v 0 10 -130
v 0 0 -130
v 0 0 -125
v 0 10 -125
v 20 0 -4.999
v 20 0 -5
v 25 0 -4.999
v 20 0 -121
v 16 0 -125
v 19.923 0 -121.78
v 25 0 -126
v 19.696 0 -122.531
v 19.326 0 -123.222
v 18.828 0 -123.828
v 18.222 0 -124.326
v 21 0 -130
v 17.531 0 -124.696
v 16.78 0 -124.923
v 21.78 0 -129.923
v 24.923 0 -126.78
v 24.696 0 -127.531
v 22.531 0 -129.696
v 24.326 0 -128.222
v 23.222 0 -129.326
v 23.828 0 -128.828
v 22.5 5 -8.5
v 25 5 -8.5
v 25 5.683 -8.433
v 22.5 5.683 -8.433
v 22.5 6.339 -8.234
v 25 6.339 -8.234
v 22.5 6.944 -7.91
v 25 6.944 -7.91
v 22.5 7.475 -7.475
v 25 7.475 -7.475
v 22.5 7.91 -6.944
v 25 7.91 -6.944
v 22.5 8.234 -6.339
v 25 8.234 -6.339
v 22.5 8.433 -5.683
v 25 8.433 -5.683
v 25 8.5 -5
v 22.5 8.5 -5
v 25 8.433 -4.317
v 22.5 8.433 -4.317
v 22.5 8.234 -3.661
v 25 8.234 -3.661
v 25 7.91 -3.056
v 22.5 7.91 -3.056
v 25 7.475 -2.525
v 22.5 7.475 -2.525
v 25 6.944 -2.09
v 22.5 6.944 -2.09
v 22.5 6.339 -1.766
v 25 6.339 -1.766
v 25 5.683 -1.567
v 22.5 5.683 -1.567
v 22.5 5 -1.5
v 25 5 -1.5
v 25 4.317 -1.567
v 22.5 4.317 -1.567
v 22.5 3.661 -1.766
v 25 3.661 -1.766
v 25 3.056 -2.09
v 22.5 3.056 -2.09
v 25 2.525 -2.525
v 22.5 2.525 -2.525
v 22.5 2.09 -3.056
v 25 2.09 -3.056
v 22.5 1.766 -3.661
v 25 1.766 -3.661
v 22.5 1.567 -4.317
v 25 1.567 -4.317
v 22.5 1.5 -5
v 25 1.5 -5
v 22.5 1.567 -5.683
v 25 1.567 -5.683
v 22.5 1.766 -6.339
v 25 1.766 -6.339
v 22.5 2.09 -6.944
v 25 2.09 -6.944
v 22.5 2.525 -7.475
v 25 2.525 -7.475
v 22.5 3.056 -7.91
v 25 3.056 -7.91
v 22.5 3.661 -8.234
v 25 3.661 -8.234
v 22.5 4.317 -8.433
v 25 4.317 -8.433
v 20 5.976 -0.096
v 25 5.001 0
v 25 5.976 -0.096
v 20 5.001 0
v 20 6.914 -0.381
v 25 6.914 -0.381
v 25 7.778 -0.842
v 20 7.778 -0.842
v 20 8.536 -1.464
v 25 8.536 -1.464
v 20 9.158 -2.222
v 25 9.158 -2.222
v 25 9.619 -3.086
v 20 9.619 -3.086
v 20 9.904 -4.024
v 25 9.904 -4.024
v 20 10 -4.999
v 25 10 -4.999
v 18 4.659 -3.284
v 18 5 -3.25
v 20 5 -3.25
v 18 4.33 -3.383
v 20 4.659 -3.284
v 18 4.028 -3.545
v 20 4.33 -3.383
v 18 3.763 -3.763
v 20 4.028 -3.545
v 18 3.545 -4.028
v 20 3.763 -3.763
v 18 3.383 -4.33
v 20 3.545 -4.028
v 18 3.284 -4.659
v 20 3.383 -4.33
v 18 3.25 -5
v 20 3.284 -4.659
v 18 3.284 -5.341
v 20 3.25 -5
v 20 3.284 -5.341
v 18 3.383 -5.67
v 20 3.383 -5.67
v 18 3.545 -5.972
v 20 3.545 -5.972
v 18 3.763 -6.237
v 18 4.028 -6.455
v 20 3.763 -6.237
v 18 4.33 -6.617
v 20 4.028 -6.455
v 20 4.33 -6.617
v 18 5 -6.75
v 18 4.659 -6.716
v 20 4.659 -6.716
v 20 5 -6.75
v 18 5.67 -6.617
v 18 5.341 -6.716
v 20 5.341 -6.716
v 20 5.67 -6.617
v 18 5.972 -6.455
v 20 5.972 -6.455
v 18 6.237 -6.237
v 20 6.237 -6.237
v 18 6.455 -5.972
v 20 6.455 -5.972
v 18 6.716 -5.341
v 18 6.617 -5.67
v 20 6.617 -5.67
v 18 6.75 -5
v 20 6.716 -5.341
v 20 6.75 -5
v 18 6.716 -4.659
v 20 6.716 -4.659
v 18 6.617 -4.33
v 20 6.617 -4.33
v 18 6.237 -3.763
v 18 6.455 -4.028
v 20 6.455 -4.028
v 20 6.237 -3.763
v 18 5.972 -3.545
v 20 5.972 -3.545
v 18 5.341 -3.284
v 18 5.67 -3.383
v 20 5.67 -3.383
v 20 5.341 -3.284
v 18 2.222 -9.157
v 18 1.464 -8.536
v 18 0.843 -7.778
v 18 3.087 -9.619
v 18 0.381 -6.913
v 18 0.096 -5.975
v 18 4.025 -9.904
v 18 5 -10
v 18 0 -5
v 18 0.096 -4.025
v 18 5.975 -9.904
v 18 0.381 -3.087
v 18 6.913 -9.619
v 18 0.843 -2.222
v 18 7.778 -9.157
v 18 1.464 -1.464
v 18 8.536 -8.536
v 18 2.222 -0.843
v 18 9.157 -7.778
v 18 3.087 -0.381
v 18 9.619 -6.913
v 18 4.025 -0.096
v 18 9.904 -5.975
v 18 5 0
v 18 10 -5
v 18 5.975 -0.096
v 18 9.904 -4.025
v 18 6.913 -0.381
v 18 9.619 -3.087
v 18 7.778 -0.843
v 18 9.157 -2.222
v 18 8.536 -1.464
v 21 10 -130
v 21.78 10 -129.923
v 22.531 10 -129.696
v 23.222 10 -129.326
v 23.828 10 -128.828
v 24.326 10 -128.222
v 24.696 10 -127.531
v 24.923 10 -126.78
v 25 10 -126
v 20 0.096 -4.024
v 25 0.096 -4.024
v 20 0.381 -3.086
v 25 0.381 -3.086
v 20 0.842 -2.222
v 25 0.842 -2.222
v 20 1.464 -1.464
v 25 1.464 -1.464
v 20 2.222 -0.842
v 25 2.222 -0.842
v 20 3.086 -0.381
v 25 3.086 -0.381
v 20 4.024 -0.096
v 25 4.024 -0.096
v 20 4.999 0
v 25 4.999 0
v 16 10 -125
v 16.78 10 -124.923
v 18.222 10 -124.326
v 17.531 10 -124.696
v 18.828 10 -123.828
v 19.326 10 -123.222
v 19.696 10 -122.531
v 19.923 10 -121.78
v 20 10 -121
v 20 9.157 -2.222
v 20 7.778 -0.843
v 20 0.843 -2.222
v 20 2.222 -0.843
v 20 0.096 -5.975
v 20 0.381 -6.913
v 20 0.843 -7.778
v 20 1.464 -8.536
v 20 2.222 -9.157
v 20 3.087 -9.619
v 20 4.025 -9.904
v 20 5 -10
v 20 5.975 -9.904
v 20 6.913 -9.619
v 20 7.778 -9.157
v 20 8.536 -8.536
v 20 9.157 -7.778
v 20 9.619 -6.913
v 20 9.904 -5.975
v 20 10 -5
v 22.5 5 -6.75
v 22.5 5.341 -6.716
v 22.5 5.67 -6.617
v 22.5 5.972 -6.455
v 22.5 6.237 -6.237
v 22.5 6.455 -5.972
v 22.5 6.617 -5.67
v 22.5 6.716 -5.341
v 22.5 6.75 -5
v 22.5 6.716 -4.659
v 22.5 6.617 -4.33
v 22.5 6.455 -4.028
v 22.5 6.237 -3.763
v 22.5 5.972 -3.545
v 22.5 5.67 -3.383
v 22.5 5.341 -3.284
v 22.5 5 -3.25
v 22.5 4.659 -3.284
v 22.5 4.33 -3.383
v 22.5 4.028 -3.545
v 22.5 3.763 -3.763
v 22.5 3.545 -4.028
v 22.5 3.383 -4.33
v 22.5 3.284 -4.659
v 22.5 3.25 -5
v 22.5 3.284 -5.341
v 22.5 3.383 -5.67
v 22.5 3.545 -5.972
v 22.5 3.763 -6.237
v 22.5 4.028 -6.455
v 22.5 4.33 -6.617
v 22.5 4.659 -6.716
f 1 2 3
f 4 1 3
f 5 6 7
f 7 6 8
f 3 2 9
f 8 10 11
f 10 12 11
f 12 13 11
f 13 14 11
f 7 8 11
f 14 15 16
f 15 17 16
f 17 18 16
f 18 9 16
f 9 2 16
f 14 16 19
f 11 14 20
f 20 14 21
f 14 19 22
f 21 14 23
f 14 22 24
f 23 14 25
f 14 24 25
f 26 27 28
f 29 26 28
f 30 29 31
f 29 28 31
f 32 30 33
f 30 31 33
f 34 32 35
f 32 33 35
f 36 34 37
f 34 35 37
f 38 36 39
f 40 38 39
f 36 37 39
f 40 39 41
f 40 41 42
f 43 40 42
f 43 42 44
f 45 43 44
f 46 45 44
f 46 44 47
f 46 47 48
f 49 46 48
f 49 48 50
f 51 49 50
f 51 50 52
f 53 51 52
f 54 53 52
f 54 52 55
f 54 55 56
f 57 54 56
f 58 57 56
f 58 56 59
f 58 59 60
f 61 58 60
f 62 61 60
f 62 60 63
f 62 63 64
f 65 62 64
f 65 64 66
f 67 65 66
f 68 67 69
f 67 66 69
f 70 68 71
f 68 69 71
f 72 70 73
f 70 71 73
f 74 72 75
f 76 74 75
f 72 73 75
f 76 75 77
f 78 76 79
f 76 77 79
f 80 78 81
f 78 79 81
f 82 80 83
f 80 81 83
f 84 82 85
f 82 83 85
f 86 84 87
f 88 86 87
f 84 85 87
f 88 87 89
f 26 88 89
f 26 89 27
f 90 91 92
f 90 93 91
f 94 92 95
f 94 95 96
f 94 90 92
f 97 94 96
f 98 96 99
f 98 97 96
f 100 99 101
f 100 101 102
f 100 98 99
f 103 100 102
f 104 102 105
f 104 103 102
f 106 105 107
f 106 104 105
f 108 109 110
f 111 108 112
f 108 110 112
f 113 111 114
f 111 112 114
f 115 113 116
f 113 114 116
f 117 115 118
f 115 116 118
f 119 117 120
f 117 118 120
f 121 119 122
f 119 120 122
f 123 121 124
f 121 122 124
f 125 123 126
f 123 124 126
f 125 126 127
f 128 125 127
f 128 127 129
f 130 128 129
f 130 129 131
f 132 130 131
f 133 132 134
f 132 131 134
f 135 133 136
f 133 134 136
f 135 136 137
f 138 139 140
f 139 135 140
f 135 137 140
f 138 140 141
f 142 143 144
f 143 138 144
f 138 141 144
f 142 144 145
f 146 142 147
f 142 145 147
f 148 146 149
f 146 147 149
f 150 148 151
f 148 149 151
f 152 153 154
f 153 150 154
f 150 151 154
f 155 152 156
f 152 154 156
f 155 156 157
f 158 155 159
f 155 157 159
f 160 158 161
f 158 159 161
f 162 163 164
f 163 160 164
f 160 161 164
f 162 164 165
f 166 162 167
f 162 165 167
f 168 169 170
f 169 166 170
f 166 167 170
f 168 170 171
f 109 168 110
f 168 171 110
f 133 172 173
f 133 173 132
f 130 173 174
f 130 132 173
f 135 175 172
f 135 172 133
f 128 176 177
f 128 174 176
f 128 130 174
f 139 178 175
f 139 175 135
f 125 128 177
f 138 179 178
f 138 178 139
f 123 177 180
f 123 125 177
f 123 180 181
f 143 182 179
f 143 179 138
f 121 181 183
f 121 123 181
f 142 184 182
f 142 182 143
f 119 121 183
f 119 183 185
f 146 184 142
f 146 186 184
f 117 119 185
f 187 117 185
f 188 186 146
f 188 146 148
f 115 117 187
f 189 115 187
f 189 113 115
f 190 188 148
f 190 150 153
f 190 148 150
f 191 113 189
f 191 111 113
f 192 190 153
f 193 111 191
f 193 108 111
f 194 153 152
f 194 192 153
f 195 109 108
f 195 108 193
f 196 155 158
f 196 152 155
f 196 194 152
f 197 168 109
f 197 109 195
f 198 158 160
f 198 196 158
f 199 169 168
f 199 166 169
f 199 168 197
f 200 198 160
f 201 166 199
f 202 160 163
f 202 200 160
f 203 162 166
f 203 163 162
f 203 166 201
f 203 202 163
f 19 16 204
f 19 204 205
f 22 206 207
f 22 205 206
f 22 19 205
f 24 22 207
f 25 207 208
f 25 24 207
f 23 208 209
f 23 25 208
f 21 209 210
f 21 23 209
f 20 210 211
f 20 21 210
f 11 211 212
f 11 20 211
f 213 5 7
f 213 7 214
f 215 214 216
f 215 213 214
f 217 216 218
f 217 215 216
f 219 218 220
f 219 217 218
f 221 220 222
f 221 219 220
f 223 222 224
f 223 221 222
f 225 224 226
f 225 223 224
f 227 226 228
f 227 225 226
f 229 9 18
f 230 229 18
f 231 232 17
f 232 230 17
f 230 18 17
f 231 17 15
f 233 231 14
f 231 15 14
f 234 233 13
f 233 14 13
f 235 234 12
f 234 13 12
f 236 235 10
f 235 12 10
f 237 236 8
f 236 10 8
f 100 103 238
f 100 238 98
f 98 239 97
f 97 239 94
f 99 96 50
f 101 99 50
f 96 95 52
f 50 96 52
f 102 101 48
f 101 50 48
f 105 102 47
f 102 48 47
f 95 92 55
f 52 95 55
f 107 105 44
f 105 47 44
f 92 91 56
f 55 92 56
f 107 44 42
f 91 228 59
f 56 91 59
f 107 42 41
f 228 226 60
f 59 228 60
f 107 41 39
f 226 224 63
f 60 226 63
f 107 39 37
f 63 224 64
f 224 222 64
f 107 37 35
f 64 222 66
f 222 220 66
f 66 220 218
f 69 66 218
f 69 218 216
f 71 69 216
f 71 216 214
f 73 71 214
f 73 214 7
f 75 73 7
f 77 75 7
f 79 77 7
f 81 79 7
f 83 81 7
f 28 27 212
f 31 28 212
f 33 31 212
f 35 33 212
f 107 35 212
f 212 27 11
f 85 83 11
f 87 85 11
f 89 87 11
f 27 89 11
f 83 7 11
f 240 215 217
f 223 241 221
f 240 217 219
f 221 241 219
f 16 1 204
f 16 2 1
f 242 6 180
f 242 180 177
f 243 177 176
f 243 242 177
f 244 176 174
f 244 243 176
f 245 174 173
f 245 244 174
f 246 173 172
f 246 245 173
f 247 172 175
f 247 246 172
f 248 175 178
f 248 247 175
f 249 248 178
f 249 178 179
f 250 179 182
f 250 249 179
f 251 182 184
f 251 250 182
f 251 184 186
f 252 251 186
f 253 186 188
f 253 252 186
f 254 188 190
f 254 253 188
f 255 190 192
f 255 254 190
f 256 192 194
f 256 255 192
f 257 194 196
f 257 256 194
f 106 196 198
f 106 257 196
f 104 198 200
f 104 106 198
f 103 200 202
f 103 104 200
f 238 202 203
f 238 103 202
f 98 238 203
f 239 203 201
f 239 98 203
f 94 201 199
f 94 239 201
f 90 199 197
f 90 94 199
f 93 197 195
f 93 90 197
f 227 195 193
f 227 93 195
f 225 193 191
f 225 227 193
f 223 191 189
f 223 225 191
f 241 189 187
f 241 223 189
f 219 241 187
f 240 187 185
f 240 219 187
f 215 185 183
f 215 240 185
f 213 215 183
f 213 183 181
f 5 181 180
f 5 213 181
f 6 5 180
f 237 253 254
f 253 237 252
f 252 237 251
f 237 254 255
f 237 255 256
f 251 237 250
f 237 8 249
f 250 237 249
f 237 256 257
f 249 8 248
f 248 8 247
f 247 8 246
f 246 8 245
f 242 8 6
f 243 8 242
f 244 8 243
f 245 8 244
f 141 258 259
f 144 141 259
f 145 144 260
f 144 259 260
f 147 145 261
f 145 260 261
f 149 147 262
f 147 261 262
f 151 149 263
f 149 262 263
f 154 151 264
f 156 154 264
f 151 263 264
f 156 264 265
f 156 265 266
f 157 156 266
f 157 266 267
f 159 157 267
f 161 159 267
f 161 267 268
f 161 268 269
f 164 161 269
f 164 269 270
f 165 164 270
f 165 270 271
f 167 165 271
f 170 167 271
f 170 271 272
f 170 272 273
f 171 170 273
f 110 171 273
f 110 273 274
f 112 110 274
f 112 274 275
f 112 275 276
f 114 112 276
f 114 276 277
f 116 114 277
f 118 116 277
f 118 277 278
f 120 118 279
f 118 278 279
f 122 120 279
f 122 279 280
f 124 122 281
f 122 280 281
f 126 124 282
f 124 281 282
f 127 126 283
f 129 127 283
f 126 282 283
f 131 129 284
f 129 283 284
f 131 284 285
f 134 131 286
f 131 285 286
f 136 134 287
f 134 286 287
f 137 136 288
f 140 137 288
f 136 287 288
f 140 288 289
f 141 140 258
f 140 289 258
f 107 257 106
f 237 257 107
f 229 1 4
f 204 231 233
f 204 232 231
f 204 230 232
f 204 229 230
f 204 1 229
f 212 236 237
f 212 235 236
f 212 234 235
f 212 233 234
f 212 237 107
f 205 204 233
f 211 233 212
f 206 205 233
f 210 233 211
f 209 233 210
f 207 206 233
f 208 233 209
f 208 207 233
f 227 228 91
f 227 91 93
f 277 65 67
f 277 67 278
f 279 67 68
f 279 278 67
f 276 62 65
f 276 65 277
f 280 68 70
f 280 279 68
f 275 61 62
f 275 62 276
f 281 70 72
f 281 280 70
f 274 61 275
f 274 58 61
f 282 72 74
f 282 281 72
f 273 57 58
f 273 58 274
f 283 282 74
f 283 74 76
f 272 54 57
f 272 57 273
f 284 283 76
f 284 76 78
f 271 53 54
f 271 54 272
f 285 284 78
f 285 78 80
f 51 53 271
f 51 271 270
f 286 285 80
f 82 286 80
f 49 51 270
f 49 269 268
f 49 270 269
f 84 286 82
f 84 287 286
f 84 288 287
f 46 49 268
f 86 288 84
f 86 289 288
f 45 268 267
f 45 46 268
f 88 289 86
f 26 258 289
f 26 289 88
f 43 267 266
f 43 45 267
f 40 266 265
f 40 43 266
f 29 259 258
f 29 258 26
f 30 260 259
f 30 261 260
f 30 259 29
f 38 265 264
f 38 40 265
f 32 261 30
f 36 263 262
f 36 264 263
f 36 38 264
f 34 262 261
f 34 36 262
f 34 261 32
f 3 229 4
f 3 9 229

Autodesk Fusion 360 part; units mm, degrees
sketch "Sketch1" plane through (0, 0, 0) normal (0, 1, 0) x (1, 0, 0)
  line L0 (0, 0) -> (25, 0) construction
  line L1 (25, 0) -> (25, 130) construction
  line L2 (25, 130) -> (0, 130) construction
  line L3 (0, 130) -> (0, 0) construction
  line L4 (25, 0) -> (20, 0)
  line L5 (0, 130) -> (0, 125)
  line L6 (20, 121) -> (20, 0)
  line L7 (25, 0) -> (25, 126)
  line L8 (0, 130) -> (21, 130)
  line L9 (16, 125) -> (0, 125)
  arc A0 (20, 121) -> (16, 125) centre (16, 121) ccw
  arc A1 (25, 126) -> (21, 130) centre (21, 126) ccw
  dimension "d1" = 25
  dimension "d2" = 130
  dimension "d3" = 5
  dimension "d4" = 4
  dimension "d5" = 4
  dimension "d18" = 5
extrude "Extrude1" add sketch "Sketch1" along normal blind 10
fillet "Fillet1" radius 5 2 edges at (22.5, 10, 0) (22.5, 0, 0)
sketch "Sketch2" plane through (25, 0, 0) normal (1, 0, 0) x (0, 0, -1)
  arc A0 (5, 10) -> (5, 0) centre (5, 5) ccw
  line L0 (5, 0) -> (126, 0)
  line L1 (126, 0) -> (126, 10)
  line L2 (126, 10) -> (5, 10)
  line L3 (0, 5) -> (5, 5) construction
  circle A1 centre (5, 5) radius 1.75
  circle A2 centre (5, 5) radius 3.5
  dimension "d9" = 5
  dimension "d10" = 3.5
  dimension "d11" = 7
extrude "Extrude2" cut sketch "Sketch2" against normal up to surface (5 mm away) contours A1
extrude "Extrude3" cut sketch "Sketch2" against normal blind 2.5 contours A2
sketch "Sketch3" plane through (20, 0, 0) normal (-1, 0, 0) x (0, 0, 1)
  circle A0 centre (-5, 5) radius 1.75
  arc A1 (-5, 0) -> (-5, 10) centre (-5, 5) ccw
  line L0 (-5, 10) -> (-121, 10)
  line L1 (-121, 10) -> (-121, 0)
  line L2 (-121, 0) -> (-5, 0)
  circle A2 centre (-5, 5) radius 5
extrude "Extrude4" add sketch "Sketch3" along normal blind 2 contours A1 A2
